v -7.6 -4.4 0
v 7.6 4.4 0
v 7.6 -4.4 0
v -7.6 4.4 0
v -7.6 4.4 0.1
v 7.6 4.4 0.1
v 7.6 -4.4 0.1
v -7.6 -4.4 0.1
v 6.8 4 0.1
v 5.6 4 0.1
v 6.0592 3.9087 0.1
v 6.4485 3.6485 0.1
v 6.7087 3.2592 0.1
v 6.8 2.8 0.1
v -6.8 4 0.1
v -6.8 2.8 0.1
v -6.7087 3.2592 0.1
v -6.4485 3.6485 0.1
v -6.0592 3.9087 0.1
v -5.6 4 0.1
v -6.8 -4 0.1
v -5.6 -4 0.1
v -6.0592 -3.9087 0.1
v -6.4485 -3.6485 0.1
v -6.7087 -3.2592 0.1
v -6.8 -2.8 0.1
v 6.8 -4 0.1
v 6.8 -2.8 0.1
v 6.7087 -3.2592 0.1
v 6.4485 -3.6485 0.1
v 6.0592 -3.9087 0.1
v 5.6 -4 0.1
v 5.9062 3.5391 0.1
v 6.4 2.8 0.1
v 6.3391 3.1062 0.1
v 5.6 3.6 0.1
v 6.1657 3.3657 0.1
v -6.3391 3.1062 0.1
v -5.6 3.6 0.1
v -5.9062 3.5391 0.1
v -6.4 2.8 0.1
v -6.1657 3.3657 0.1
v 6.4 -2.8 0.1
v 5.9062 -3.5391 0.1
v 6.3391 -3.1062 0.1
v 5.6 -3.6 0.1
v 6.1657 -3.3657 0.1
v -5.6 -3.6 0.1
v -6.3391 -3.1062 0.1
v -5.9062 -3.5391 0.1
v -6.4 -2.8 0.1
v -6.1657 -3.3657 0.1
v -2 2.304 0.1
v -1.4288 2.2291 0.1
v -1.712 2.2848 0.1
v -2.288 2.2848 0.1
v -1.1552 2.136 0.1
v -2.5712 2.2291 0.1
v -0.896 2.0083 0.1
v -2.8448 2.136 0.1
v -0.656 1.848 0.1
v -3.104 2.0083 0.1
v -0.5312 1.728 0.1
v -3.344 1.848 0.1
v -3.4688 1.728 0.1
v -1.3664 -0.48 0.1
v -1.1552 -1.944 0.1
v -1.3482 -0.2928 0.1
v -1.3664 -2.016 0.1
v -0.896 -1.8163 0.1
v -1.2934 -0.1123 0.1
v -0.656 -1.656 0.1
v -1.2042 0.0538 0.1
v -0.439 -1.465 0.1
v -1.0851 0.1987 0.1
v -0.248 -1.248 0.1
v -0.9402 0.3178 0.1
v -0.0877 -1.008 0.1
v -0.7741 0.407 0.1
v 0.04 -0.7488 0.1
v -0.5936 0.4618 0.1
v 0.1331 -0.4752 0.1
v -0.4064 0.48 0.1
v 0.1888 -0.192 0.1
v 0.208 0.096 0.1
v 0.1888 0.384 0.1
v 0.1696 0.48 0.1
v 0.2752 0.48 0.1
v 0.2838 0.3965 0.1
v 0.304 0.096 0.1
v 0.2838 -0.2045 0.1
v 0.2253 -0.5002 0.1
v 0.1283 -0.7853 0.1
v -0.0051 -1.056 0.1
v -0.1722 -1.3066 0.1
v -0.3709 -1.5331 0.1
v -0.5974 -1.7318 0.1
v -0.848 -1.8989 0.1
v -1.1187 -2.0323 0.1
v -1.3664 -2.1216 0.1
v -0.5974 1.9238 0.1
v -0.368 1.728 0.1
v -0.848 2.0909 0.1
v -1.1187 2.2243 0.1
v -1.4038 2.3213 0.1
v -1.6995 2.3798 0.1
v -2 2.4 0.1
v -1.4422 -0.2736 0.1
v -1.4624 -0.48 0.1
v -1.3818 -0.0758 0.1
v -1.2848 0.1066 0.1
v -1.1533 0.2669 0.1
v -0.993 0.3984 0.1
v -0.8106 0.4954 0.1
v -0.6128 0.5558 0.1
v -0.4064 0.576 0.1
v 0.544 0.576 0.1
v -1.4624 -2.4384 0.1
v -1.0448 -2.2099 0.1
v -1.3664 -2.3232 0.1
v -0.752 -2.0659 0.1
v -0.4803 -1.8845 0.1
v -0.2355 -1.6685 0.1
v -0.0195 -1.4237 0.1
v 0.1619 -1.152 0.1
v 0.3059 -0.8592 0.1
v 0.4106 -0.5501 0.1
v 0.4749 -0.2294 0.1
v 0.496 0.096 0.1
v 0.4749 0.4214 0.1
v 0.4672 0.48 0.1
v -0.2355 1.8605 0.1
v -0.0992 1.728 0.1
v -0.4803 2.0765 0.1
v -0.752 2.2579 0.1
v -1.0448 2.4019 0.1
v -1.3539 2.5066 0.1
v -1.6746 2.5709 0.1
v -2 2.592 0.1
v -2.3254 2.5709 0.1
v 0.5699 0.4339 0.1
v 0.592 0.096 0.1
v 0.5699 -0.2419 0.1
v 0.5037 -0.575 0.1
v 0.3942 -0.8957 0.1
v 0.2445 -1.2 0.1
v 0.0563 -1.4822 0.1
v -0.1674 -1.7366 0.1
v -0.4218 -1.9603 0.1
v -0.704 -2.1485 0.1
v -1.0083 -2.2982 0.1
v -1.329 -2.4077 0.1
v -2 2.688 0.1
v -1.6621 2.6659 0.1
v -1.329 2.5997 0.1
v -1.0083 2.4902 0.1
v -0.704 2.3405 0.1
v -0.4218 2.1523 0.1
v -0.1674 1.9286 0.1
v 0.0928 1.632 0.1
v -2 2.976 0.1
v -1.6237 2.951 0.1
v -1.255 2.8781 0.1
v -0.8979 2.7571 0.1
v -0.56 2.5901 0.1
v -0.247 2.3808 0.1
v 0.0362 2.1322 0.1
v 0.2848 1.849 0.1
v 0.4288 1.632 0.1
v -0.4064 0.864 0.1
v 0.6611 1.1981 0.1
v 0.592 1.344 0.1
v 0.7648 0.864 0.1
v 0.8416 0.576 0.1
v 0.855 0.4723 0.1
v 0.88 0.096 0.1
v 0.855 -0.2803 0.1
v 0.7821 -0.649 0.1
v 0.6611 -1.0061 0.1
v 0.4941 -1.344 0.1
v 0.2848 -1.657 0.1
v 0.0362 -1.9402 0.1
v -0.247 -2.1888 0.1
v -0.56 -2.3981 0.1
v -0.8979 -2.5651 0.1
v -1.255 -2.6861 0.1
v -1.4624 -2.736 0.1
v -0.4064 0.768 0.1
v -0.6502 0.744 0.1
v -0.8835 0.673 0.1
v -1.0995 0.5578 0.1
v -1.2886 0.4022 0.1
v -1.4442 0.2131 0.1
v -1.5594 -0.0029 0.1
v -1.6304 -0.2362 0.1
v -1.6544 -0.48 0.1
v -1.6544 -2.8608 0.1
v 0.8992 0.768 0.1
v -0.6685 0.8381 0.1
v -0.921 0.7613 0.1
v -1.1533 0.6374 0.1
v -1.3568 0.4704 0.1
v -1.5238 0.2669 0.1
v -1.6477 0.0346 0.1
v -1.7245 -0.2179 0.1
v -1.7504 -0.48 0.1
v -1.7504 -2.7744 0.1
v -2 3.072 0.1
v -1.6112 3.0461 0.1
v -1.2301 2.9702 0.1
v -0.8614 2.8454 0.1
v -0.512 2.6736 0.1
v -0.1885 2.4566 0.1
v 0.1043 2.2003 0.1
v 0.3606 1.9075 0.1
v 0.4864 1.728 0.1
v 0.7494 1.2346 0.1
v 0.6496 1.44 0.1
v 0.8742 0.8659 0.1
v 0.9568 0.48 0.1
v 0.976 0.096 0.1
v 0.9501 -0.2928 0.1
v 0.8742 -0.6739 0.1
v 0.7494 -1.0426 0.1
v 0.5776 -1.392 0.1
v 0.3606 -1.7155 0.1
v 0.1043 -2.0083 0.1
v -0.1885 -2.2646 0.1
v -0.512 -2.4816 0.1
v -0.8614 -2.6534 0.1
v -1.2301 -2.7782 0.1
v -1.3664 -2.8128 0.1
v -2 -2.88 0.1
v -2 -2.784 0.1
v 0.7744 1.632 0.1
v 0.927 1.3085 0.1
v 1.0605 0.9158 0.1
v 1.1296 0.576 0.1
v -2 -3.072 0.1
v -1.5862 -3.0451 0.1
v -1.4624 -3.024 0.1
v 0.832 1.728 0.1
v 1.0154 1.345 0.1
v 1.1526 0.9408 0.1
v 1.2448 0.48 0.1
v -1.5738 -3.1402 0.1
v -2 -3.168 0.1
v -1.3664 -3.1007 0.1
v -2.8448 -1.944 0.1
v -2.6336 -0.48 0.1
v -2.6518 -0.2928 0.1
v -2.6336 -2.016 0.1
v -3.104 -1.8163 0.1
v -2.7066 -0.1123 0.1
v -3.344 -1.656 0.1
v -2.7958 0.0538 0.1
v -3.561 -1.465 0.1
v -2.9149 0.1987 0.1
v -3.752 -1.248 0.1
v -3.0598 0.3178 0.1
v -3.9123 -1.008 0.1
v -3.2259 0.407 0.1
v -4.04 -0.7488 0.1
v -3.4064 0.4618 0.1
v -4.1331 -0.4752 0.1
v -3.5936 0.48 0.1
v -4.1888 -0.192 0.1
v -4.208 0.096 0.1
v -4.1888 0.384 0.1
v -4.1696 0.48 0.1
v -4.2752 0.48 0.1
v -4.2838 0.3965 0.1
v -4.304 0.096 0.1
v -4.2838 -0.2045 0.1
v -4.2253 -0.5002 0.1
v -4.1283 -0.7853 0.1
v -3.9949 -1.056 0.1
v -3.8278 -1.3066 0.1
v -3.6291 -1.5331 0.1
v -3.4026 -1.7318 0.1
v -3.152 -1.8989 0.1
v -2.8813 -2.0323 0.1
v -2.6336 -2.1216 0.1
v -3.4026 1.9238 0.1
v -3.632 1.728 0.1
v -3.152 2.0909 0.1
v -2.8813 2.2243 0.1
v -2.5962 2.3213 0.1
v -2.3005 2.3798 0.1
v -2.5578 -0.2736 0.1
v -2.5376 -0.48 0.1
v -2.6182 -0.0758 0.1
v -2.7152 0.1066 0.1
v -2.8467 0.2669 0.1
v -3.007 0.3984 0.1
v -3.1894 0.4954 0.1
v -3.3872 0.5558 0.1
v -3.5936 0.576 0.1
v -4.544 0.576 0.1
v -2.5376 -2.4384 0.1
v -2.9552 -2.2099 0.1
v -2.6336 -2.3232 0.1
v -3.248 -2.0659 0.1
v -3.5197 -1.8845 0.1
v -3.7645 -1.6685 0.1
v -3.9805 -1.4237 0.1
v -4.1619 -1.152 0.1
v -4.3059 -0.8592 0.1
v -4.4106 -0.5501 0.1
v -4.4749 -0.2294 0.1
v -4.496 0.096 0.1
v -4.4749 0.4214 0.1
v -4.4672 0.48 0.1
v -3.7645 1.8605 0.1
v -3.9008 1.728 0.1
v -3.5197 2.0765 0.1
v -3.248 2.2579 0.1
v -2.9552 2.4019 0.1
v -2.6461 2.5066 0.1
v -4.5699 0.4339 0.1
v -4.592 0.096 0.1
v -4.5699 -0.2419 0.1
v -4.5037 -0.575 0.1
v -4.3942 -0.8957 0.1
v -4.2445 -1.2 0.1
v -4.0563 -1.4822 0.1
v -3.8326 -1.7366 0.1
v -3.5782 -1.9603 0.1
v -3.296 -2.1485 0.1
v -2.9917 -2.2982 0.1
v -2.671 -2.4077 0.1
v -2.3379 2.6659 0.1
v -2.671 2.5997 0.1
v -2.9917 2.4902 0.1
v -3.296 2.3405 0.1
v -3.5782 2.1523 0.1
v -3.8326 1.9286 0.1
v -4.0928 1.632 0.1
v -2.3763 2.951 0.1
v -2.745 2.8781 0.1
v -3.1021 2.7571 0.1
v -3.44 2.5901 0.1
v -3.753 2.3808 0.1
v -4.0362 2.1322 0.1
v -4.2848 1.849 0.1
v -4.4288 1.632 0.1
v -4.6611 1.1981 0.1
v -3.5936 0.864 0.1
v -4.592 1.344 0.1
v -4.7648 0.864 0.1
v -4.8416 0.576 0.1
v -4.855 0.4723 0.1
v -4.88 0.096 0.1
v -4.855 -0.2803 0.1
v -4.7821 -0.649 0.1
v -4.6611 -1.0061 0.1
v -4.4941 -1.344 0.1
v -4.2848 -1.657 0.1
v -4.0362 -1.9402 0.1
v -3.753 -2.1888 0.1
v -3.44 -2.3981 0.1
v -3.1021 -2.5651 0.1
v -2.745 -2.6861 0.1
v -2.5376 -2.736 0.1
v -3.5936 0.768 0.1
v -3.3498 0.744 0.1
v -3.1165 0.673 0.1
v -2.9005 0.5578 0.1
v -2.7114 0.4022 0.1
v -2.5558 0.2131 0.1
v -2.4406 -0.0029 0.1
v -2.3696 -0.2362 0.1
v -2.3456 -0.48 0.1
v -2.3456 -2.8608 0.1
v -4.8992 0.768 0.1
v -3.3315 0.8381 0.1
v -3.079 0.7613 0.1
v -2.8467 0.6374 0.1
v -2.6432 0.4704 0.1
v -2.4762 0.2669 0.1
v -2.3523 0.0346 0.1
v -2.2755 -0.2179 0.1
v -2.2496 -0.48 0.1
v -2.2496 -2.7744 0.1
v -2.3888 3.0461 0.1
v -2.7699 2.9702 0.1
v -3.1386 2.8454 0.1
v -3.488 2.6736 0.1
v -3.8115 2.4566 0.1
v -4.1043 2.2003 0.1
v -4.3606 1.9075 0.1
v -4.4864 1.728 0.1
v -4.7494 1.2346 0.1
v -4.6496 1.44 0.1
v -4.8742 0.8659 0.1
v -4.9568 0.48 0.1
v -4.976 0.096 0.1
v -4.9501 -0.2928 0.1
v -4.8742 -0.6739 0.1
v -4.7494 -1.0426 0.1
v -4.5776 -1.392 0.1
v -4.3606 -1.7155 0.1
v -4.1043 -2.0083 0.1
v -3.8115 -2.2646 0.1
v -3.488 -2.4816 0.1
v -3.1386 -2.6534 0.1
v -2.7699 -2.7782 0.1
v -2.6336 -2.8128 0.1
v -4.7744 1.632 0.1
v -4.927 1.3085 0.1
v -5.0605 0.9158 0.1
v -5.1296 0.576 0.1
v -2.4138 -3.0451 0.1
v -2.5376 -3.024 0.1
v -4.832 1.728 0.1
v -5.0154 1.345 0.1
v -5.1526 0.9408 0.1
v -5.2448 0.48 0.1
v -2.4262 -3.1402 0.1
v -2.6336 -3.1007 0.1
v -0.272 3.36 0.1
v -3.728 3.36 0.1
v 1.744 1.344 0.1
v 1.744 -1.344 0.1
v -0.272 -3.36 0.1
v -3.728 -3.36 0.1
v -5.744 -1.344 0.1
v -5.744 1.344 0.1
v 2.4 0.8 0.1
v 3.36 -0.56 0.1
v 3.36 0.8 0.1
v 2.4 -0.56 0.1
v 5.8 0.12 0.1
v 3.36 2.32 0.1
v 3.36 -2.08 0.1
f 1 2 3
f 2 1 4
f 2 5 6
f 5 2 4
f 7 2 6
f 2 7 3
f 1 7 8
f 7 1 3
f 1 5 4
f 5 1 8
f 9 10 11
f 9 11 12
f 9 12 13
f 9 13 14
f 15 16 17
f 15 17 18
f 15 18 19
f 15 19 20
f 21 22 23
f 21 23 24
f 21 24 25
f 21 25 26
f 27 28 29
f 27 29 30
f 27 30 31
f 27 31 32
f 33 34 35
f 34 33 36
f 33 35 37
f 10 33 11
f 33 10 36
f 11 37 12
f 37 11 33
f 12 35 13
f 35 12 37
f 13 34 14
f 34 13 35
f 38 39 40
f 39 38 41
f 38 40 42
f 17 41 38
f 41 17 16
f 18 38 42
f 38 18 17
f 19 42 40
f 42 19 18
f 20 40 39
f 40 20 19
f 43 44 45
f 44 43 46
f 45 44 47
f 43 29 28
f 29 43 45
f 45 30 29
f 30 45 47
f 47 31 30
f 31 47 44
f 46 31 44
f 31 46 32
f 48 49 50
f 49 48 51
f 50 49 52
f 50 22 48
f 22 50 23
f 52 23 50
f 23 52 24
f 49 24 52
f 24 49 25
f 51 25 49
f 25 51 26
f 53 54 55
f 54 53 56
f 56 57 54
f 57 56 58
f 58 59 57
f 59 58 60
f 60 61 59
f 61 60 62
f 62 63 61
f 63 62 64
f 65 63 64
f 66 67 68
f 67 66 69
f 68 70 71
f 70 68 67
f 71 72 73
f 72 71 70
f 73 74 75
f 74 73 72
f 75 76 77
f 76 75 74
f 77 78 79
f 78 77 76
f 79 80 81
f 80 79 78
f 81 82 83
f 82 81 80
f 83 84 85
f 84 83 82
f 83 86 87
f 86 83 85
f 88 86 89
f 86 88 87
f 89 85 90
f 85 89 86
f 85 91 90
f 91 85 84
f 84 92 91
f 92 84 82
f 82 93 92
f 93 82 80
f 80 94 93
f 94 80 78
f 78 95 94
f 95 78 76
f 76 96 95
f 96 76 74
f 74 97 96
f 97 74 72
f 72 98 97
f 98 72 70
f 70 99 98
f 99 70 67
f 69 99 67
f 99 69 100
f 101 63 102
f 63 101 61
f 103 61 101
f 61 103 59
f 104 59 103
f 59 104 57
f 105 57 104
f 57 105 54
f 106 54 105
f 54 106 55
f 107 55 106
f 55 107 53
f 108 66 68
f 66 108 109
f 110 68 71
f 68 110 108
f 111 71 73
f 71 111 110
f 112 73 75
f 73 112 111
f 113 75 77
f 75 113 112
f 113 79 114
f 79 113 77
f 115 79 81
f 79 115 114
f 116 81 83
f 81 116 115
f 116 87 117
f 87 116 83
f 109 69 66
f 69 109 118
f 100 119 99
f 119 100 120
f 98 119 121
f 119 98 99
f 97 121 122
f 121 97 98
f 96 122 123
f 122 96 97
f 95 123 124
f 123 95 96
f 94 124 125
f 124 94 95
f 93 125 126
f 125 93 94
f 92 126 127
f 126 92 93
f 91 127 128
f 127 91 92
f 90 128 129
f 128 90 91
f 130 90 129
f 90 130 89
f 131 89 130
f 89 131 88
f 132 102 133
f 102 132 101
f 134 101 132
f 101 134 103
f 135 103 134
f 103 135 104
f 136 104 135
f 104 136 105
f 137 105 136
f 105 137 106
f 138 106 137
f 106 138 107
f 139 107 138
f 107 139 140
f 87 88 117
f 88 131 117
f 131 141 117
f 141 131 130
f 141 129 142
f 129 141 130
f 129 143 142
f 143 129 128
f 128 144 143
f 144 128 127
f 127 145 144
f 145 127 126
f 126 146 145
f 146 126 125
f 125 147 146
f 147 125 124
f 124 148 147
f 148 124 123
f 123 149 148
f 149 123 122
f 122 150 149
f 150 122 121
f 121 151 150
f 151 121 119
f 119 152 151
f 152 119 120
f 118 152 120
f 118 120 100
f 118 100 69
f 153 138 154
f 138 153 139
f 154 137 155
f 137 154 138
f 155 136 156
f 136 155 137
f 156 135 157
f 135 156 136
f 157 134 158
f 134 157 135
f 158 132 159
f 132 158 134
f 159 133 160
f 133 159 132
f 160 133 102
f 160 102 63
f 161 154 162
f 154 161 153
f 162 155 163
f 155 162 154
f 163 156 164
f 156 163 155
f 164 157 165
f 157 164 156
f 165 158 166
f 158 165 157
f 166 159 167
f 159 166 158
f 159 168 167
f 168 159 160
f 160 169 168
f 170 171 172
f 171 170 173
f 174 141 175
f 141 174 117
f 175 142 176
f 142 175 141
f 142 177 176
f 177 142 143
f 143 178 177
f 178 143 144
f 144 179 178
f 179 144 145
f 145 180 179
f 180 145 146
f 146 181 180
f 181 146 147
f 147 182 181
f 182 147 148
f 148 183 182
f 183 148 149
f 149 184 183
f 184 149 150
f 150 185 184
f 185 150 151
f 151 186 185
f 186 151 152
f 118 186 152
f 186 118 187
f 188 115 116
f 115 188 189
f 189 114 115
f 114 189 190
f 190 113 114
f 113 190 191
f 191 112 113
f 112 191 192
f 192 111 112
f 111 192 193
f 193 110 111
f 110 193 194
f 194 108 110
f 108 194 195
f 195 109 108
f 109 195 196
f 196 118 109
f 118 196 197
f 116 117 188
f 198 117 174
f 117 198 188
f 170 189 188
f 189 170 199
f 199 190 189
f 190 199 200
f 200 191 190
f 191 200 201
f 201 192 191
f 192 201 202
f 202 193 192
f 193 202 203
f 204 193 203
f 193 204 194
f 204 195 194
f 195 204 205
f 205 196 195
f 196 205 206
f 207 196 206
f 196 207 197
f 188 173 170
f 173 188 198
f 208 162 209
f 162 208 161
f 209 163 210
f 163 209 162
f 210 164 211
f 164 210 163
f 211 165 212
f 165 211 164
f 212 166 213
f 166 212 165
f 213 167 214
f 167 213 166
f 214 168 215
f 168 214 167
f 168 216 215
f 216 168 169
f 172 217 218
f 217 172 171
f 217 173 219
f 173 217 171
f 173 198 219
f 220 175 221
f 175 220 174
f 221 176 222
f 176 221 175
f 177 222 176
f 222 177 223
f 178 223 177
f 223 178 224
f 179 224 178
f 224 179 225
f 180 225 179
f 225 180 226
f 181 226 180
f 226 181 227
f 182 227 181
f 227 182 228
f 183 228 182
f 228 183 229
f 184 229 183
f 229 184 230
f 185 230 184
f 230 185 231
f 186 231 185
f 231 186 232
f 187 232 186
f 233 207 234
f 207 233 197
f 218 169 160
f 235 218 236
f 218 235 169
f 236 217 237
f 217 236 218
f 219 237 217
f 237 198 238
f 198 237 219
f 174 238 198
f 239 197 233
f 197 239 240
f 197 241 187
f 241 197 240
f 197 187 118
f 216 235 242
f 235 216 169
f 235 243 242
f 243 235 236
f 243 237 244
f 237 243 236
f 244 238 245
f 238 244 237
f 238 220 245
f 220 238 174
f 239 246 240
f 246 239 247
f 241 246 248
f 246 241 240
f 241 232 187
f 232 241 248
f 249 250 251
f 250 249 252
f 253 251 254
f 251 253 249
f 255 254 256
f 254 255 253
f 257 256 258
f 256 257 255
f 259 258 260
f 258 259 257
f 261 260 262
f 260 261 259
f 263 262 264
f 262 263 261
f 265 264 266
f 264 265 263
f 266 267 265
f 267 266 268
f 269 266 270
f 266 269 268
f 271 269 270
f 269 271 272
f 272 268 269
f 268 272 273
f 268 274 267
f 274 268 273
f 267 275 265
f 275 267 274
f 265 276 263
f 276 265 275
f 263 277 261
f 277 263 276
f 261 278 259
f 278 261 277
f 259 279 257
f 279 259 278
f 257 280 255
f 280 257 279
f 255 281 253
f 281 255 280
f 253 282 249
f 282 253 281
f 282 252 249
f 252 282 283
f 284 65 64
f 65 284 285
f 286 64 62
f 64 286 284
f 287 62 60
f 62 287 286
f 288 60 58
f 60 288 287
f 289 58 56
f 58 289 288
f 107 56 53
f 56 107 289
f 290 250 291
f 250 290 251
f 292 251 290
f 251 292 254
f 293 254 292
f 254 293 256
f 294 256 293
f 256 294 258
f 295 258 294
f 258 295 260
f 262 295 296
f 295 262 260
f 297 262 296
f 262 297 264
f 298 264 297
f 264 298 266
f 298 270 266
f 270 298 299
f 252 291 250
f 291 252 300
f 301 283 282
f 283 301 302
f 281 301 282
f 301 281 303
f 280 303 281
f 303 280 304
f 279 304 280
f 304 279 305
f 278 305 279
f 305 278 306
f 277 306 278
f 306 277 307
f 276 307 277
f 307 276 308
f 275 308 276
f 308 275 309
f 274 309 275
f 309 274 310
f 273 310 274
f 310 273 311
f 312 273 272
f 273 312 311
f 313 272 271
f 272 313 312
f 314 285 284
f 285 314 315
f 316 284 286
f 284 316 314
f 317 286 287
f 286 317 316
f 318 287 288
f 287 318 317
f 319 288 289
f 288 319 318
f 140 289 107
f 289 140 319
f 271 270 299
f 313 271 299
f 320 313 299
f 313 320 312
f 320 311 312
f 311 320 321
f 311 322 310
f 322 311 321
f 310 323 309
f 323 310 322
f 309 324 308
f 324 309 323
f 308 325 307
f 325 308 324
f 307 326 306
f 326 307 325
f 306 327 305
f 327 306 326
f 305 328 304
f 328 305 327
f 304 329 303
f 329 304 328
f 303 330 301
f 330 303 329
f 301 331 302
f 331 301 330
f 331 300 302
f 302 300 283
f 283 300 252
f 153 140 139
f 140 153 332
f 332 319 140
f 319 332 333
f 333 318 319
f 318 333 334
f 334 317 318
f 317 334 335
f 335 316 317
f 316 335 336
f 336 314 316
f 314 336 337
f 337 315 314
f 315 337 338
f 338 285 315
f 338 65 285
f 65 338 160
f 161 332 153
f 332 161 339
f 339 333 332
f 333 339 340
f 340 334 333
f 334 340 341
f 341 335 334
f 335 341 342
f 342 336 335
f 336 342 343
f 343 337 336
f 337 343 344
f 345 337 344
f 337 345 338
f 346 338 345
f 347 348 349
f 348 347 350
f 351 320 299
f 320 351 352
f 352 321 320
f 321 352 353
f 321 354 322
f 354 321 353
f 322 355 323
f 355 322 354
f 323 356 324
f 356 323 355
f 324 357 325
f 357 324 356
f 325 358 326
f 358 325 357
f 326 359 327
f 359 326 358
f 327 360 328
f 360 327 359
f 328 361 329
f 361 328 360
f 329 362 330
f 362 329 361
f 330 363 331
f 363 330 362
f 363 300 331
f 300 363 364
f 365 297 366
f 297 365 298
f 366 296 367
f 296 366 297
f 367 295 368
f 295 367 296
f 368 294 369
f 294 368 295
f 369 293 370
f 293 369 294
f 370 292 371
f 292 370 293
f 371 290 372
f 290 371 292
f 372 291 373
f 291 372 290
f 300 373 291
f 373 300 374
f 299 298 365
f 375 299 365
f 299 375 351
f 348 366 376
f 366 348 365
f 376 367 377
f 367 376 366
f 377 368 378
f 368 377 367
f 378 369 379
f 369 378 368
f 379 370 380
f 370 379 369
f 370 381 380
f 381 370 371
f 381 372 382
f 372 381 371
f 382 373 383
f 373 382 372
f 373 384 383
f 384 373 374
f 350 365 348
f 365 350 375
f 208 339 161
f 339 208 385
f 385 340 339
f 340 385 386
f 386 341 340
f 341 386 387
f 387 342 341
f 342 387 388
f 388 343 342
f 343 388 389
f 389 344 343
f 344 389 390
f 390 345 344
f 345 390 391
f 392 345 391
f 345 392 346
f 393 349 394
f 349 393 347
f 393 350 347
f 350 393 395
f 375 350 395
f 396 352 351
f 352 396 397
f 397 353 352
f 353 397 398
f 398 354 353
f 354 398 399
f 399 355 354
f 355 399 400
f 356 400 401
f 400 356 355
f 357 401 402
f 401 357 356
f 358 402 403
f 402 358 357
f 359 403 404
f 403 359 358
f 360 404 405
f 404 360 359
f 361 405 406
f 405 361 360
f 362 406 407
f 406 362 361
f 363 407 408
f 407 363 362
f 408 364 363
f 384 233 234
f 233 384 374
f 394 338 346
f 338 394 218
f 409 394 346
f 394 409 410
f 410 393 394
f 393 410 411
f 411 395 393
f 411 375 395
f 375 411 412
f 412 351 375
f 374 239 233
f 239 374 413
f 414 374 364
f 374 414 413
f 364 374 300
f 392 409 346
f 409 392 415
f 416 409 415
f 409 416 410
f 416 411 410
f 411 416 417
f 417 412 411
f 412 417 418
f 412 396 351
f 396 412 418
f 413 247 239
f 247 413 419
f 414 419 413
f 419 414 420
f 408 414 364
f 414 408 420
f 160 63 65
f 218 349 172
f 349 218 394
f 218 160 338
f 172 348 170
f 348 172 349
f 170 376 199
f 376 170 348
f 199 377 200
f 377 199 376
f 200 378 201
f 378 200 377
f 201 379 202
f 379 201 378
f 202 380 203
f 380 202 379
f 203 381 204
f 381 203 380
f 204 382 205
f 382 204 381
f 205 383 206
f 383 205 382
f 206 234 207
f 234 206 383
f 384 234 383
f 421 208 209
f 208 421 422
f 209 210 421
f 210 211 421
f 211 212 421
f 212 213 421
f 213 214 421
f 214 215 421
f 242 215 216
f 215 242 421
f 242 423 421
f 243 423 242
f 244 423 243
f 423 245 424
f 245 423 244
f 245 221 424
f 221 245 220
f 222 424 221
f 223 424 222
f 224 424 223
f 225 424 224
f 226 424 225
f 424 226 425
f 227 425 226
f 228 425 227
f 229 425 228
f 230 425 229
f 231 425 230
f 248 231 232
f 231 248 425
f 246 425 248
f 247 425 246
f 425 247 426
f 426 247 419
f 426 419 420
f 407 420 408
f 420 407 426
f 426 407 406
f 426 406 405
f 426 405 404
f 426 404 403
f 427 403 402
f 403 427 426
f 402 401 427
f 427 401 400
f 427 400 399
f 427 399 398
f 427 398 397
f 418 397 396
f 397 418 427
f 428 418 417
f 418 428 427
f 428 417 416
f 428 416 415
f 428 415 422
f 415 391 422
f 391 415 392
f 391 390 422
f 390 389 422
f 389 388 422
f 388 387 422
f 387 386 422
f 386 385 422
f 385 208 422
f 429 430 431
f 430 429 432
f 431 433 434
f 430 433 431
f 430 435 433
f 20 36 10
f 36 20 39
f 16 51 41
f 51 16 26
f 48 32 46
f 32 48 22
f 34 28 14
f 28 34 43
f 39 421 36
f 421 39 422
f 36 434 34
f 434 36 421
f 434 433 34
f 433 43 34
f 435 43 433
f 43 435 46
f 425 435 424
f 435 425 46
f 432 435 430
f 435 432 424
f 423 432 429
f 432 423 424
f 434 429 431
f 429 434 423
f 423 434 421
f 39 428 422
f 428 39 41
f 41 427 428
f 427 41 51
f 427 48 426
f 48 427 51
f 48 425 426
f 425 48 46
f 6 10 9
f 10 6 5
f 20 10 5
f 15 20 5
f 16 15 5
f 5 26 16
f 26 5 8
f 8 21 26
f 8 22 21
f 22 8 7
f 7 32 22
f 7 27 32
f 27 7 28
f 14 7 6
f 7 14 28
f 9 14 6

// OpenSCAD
use <../lib.scad>
use <163555h.scad>
function ldraw_lib__163555i() = [
// 0 Sticker  1.1 x  1.9 with Monorail Station Direction Sign - Right
// 0 Name: 163555i.dat
// 0 Author: Takeshi Takahashi [RainbowDolphin]
// 0 !LDRAW_ORG Part UPDATE 2023-02
// 0 !LICENSE Licensed under CC BY 4.0 : see CAreadme.txt
// 
// 0 BFC CERTIFY CCW
  [0,"BFC","CERTIFY"],
  [0,"BFC","CCW"],
// 
// 0 !KEYWORDS Bricklink 6399stk01, Brickowl 458337, Rebrickable 163555, set 6399
// 
// 0 !HISTORY 2023-04-17 [OrionP] Official Update 2023-02
// 
// 
// 1 16 0 0 0 -1 0 0 0 1 0 0 0 1 163555h.dat
  [1,16,0,0,0,-1,0,0,0,1,0,0,0,1, ldraw_lib__163555h()],
];
module ldraw_lib__163555i(step=0, col=false, unit=2/5, alt=false, line=0.2, solid=!$preview)
    makepoly(ldraw_lib__163555i(), step=step, col=col, unit=unit, alt=alt, line=line, solid=solid);
ldraw_lib__163555i(line=0.2);
